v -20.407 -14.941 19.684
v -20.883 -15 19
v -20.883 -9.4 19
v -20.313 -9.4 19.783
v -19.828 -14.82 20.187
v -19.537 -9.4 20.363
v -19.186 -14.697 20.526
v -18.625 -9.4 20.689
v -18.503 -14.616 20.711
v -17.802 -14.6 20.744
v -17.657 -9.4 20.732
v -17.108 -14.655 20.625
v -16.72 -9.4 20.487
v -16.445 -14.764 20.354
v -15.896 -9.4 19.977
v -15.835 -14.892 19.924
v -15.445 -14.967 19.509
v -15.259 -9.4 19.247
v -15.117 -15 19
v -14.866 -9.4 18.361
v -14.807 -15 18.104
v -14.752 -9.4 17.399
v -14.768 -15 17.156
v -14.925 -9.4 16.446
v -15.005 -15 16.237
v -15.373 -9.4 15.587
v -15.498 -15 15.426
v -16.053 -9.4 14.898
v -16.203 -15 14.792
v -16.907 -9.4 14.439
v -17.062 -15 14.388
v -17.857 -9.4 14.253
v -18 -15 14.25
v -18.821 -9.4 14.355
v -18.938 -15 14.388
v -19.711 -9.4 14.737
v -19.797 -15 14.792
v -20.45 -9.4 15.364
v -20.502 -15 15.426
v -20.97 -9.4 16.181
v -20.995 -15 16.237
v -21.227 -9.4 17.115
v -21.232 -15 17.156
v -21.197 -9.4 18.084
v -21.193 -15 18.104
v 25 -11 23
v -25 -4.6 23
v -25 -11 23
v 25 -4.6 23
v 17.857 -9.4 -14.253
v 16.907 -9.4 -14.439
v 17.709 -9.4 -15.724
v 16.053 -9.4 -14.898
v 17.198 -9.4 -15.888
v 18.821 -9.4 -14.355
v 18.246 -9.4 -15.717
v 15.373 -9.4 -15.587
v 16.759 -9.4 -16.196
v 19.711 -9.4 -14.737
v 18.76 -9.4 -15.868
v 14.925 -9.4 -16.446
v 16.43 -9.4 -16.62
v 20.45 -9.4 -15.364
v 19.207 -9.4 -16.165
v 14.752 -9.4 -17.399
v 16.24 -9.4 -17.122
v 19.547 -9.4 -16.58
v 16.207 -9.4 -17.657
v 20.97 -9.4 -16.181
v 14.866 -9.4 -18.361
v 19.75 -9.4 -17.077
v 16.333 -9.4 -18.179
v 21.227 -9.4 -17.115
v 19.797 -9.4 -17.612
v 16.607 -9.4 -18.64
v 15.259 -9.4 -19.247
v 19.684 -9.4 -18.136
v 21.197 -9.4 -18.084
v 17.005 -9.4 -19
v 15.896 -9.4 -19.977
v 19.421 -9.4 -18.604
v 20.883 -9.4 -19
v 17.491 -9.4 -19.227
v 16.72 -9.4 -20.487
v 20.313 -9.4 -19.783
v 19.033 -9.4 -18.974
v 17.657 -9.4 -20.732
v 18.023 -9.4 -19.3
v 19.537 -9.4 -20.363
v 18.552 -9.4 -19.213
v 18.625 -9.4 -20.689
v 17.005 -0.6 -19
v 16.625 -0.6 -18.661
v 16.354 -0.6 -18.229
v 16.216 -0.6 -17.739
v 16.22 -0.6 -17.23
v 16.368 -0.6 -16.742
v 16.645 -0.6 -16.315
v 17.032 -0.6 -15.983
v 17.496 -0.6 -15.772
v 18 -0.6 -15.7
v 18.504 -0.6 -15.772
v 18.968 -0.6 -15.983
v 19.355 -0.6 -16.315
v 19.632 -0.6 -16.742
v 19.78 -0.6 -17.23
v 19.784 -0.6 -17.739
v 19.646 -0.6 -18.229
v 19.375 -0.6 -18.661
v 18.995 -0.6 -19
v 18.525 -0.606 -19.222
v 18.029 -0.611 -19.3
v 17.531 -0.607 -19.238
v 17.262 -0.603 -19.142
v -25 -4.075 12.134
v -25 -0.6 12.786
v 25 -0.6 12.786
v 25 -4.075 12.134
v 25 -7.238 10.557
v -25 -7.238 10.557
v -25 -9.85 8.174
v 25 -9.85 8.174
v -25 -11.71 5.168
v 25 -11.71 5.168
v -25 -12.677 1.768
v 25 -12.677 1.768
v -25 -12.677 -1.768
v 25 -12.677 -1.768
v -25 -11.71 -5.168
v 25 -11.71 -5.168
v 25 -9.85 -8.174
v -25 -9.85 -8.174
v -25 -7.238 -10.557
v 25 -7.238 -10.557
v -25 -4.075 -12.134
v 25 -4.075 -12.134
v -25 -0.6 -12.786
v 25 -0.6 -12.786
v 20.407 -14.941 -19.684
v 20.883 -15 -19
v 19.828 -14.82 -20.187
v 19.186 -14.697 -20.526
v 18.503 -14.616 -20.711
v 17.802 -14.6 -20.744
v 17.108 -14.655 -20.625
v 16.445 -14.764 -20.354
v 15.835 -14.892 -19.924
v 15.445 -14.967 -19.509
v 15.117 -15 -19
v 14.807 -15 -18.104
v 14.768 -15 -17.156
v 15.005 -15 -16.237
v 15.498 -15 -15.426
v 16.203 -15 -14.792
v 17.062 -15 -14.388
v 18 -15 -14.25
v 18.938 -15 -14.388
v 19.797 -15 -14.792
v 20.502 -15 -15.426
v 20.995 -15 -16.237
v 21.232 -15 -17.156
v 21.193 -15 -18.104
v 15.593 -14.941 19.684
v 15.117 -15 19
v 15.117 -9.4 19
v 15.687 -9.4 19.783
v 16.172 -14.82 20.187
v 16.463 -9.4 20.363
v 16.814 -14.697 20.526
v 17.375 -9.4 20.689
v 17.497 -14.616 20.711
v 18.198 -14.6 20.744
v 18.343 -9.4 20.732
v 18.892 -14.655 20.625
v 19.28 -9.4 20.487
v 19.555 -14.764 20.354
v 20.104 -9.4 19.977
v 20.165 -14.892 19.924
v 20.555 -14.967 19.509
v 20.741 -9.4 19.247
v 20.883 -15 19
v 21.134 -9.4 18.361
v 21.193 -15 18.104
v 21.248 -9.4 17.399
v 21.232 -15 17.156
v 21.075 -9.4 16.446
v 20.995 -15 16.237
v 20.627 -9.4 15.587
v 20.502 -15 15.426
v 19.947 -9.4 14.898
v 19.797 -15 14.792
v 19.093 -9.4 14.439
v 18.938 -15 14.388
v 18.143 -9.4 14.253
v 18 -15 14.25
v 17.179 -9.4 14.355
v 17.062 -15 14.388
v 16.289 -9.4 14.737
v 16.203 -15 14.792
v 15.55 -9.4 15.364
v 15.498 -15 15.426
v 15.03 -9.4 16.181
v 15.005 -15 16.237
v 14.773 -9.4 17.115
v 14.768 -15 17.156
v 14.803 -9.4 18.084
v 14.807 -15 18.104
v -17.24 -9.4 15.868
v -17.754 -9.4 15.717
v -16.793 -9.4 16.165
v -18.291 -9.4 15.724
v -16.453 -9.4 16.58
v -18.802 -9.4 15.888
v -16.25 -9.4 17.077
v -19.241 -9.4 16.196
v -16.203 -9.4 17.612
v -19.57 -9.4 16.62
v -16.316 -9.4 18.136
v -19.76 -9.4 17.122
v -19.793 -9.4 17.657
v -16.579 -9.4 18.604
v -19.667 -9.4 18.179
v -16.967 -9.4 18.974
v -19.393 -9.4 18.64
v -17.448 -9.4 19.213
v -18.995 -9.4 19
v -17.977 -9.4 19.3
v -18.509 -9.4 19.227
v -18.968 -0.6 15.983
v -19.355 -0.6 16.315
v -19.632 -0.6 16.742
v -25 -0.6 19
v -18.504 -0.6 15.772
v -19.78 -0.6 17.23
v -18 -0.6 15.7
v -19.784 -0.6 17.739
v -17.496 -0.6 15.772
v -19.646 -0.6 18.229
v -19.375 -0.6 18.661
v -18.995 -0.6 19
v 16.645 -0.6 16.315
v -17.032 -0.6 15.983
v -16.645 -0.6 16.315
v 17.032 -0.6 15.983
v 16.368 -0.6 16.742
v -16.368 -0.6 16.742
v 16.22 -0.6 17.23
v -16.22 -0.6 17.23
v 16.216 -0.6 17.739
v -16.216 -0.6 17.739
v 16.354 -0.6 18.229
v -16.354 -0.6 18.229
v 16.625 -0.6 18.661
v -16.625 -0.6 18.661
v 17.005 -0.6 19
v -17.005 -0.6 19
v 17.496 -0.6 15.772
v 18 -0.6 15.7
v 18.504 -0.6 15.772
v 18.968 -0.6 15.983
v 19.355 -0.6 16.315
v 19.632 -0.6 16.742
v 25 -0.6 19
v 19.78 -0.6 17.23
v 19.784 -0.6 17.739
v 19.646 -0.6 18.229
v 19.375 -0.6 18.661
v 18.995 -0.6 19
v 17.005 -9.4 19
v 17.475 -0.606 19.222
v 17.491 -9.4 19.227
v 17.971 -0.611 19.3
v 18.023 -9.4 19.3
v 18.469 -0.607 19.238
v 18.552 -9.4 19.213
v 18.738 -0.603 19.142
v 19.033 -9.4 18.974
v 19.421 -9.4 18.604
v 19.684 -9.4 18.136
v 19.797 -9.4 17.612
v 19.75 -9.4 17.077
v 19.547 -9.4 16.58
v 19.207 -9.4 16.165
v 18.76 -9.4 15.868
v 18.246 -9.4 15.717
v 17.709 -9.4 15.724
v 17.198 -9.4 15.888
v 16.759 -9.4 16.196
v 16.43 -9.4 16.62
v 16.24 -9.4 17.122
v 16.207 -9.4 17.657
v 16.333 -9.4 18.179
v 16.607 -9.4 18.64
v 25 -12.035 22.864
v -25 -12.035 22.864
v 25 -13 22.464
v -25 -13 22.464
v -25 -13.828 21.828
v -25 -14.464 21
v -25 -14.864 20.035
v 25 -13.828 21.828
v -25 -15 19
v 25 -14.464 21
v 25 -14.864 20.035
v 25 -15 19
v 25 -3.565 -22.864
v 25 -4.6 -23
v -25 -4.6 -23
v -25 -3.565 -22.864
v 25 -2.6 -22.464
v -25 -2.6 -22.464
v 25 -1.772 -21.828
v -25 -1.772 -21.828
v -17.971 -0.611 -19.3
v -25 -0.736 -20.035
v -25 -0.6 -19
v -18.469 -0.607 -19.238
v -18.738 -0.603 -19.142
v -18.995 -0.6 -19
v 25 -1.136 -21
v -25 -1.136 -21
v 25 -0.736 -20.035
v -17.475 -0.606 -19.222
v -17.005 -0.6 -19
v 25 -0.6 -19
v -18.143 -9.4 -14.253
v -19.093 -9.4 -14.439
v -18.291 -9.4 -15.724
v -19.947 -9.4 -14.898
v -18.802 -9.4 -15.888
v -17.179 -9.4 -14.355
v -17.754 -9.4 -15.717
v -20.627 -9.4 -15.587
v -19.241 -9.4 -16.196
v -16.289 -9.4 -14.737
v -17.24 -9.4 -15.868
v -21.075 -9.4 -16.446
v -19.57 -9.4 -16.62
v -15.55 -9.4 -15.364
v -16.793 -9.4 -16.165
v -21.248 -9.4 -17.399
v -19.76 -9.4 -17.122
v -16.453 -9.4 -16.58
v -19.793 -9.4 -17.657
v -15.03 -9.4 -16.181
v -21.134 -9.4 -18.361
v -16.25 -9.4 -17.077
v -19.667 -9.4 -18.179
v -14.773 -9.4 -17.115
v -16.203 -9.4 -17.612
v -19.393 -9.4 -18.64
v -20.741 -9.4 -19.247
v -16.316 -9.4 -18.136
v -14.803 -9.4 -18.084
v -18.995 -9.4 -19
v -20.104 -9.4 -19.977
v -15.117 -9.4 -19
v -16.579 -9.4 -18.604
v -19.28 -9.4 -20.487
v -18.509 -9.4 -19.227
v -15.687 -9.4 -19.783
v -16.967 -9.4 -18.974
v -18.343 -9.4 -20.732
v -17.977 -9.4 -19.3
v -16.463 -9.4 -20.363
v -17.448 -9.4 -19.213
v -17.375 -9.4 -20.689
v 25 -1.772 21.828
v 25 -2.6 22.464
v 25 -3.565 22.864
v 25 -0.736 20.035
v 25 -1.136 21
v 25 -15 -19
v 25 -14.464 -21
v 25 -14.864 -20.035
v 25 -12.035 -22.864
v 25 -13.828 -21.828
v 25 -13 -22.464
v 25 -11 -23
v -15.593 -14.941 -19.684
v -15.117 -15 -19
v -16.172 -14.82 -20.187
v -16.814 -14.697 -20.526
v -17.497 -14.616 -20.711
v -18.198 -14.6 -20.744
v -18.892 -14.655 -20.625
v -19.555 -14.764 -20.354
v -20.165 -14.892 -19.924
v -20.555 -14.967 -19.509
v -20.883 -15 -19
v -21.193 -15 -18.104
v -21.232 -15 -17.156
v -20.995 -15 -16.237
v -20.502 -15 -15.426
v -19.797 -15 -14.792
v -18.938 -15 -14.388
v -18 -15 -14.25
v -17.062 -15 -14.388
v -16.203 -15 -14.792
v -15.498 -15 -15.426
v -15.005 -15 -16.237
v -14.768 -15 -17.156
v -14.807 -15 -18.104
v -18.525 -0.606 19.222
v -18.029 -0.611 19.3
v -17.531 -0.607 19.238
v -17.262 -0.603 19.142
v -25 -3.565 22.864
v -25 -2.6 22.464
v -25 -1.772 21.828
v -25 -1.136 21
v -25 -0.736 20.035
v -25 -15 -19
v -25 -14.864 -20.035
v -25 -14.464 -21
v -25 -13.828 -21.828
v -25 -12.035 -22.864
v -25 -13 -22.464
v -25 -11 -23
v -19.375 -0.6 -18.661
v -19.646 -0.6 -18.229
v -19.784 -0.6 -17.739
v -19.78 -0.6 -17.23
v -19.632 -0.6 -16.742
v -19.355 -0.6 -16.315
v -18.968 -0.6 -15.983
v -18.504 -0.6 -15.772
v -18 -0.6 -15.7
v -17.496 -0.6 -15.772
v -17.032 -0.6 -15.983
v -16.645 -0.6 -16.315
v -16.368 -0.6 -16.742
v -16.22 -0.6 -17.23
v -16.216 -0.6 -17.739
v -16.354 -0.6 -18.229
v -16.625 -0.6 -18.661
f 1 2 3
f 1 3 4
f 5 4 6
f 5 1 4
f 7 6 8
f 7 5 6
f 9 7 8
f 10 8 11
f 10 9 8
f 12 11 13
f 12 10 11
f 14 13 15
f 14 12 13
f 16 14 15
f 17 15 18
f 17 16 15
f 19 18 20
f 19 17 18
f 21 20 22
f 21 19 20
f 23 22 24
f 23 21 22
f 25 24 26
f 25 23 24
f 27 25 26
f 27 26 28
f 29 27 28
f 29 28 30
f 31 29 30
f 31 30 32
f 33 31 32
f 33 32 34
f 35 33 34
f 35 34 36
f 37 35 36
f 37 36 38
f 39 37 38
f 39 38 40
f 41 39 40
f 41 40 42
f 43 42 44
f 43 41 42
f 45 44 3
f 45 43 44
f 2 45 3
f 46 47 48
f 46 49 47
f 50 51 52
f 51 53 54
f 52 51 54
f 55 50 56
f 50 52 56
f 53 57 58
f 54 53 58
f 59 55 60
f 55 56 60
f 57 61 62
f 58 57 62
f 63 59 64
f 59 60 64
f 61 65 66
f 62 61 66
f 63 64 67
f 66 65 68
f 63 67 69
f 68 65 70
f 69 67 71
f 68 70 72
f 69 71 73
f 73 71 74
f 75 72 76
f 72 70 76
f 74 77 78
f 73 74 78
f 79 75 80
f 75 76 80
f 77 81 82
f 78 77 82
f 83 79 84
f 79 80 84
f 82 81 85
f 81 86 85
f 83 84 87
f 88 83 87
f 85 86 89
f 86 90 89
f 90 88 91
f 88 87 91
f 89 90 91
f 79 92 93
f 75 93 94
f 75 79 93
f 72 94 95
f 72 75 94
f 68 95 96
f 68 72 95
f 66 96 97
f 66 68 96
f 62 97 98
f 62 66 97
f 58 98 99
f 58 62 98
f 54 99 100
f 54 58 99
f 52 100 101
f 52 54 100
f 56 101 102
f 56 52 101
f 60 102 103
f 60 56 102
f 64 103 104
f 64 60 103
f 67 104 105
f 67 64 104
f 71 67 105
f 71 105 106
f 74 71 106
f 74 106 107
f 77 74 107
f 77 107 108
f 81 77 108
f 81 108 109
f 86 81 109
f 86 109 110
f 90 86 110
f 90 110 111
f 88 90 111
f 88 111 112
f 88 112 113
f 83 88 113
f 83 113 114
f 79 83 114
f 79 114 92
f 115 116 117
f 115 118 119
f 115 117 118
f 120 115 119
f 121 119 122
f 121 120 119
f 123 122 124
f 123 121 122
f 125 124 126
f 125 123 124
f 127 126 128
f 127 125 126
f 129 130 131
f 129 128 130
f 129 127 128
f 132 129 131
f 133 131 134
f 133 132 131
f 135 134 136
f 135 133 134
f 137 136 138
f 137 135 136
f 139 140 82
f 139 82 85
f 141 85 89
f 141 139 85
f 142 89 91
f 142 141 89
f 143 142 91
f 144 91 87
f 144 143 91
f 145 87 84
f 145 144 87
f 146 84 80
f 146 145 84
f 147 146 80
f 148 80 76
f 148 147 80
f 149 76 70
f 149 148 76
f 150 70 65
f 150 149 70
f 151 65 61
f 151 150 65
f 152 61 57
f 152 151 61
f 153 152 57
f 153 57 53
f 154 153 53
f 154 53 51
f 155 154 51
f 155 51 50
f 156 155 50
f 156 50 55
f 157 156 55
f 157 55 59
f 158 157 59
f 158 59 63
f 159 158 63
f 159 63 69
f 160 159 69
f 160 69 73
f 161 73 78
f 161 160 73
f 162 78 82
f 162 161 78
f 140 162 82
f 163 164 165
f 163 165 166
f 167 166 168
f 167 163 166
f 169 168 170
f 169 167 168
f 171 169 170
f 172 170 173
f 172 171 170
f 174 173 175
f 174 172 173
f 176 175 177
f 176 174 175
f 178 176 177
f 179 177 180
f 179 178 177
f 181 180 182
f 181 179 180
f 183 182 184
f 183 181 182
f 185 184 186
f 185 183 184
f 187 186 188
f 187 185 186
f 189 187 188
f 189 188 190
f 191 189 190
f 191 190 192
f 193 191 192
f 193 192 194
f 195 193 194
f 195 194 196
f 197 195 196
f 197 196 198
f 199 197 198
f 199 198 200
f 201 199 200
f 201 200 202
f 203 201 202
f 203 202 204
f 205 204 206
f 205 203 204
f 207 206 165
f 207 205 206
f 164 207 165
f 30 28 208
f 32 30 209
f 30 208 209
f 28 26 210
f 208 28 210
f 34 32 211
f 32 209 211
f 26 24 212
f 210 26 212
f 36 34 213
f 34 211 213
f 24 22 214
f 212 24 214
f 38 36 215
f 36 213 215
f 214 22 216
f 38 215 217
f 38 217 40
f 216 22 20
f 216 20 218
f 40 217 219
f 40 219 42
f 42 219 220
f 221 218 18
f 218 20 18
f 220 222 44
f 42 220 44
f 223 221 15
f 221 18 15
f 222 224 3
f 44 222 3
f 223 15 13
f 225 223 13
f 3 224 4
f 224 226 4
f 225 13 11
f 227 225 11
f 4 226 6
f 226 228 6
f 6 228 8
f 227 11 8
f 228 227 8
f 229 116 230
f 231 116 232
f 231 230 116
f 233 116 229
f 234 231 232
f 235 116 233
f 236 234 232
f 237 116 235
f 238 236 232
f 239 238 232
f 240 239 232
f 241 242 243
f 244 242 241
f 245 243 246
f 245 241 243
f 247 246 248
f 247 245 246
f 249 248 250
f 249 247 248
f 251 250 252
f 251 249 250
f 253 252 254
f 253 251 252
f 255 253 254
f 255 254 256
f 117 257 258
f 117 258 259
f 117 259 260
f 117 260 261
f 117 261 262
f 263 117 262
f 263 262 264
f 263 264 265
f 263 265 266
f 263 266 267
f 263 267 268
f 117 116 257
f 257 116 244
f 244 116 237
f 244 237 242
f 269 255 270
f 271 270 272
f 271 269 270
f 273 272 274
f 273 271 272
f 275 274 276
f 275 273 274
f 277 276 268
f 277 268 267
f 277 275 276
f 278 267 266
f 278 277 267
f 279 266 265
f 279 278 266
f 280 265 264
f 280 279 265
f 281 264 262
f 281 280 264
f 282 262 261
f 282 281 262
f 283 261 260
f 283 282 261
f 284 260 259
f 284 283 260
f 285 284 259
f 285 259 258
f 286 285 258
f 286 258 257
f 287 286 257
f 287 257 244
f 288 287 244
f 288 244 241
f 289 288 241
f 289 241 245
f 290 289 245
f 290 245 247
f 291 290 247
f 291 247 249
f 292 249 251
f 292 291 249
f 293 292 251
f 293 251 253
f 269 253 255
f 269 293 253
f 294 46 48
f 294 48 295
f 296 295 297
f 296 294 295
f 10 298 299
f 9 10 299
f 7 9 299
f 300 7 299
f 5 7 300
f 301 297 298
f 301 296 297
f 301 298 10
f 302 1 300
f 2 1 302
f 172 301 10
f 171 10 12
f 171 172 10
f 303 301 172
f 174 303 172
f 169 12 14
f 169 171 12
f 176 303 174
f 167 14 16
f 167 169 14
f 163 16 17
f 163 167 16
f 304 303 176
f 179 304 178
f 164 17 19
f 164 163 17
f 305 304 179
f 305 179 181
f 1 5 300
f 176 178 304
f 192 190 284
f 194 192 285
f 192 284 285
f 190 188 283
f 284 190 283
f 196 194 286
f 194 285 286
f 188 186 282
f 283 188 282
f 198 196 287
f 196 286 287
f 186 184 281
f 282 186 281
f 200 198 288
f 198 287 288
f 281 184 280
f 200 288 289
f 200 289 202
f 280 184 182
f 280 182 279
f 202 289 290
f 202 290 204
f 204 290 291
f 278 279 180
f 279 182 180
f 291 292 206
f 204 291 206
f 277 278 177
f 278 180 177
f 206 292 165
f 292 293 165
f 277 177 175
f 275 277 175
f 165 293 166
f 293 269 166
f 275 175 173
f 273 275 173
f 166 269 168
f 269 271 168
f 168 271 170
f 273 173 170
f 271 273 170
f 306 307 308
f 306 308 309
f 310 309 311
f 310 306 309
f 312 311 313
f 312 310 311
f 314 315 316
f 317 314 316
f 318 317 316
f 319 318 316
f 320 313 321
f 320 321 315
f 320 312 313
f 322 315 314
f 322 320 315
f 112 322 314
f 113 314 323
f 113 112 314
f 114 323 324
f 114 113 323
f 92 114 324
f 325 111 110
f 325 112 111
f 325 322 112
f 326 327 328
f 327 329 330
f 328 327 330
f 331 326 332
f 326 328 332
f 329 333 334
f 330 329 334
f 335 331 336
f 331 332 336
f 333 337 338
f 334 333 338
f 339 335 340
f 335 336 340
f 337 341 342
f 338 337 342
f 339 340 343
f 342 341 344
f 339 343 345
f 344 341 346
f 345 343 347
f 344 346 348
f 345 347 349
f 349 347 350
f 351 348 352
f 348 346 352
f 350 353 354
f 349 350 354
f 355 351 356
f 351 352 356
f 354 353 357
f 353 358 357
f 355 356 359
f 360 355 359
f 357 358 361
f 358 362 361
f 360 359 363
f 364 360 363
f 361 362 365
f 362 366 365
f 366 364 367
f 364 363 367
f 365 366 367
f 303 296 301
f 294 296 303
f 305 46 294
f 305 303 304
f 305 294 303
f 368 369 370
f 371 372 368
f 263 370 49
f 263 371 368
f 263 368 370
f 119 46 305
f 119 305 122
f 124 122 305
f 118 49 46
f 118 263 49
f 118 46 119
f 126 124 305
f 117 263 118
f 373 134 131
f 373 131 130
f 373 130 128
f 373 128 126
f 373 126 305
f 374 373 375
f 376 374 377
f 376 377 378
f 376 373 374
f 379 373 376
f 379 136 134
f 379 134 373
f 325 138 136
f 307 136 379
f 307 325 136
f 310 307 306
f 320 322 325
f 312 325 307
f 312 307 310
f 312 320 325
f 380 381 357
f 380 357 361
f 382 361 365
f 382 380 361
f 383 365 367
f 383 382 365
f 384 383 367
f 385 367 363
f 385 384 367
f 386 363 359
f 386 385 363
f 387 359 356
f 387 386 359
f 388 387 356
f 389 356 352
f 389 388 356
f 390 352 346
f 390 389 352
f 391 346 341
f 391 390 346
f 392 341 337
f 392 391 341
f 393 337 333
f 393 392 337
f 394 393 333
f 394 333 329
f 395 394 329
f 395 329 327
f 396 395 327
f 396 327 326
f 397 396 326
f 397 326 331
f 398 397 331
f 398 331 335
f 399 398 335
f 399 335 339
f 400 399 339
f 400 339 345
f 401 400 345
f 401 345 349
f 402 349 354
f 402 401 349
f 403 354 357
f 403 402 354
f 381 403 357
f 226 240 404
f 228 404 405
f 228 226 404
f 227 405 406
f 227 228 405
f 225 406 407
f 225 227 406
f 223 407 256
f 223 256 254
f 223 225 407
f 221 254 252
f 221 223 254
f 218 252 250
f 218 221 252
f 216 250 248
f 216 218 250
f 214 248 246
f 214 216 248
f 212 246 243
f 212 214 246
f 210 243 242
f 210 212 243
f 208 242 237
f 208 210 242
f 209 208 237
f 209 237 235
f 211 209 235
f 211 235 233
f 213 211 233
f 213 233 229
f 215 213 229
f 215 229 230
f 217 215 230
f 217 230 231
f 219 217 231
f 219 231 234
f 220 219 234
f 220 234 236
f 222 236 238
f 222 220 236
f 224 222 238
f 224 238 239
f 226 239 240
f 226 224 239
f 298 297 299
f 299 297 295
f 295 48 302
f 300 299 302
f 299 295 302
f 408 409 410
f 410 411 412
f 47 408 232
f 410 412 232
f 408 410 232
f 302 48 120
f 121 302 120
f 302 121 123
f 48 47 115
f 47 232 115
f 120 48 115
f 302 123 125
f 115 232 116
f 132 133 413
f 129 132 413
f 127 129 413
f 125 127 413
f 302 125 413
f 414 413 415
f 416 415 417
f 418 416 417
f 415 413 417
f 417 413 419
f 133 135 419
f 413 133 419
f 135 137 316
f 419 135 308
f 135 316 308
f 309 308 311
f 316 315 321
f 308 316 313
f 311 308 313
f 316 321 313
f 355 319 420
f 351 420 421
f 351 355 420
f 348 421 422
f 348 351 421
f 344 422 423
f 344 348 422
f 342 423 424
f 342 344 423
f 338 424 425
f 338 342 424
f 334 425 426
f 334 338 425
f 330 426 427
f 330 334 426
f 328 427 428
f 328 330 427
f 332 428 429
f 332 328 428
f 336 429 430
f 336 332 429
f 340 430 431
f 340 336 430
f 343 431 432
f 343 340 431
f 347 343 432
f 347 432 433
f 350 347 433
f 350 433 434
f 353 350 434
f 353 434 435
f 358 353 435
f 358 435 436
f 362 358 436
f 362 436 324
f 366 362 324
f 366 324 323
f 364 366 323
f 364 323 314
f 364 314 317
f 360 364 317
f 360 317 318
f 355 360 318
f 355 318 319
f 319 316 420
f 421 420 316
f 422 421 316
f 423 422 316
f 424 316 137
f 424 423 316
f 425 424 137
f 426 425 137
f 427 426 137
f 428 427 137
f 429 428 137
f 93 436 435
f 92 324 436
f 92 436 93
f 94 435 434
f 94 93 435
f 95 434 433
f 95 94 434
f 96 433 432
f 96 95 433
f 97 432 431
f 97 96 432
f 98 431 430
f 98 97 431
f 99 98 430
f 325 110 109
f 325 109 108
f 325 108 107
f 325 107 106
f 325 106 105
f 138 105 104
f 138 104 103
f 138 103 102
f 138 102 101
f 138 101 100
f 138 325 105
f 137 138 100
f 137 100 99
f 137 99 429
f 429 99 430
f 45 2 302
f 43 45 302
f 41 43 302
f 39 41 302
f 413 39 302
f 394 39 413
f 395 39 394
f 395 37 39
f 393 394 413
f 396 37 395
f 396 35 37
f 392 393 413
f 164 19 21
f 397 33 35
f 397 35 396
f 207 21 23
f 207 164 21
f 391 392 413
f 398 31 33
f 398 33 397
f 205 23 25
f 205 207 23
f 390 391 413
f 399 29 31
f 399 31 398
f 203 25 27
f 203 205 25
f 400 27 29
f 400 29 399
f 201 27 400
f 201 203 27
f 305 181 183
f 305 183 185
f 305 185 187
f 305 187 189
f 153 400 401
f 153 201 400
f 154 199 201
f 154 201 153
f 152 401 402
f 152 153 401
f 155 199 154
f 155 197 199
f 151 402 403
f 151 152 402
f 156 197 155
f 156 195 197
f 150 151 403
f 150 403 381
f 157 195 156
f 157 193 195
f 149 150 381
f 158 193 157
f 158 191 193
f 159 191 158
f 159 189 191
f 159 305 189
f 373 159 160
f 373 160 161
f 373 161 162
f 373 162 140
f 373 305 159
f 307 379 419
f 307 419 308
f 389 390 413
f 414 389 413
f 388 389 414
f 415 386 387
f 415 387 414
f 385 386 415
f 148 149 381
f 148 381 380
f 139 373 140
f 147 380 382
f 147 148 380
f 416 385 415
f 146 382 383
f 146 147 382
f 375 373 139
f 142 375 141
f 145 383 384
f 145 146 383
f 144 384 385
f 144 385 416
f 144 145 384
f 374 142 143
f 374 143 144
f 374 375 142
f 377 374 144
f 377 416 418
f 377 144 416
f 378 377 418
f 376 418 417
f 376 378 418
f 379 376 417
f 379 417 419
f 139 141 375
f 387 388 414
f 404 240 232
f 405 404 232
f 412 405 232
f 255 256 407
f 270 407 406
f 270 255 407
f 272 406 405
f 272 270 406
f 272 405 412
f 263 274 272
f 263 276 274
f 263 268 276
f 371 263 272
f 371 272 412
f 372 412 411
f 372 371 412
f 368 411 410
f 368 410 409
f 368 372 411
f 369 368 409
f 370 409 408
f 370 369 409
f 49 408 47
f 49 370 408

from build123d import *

# Parameters (mm, degrees)
BOSS_EXTRUDE1_DEPTH     = 25
CUT_EXTRUDE1_DEPTH      = 38.134889255
CUT_EXTRUDE1_DEPTH_BACK = 38.134889255
SKETCH2_R               = 12.8
SKETCH3_R               = 1.8
CUT_EXTRUDE2_DEPTH      = 16
SKETCH4_R               = 3.25
CUT_EXTRUDE3_DEPTH      = 5.6


with BuildPart() as part:
    # Sketch1 → Boss-Extrude1 (new, symmetric)
    with BuildSketch(Plane(origin=(0, 0, 0), x_dir=(0, 0, -1), z_dir=(1, 0, 0))):
        with BuildLine():
            Line((-19, -15), (19, -15))
            ThreePointArc((19, -15), (21.828427125, -13.828427125), (23, -11))
            Line((23, -11), (23, -4.6))
            ThreePointArc((23, -4.6), (21.828427125, -1.771572875), (19, -0.6))
            Line((19, -0.6), (-19, -0.6))
            ThreePointArc((-19, -0.6), (-21.828427125, -1.771572875), (-23, -4.6))
            Line((-23, -4.6), (-23, -11))
            ThreePointArc((-23, -11), (-21.828427125, -13.828427125), (-19, -15))
        make_face()
    extrude(amount=BOSS_EXTRUDE1_DEPTH, both=True)

    # Sketch2 → Cut-Extrude1 (cut, two sides: drawn at the far end of the back side and taken through both)
    with BuildSketch(Plane(origin=(0, 0, 0), x_dir=(0, 0, -1), z_dir=(1, 0, 0)).offset(-CUT_EXTRUDE1_DEPTH_BACK)):
        Circle(SKETCH2_R)
    extrude(amount=CUT_EXTRUDE1_DEPTH + CUT_EXTRUDE1_DEPTH_BACK, mode=Mode.SUBTRACT)

    # Sketch3 → Cut-Extrude2 (cut)
    with BuildSketch(Plane(origin=(0, -15, 0), x_dir=(1, 0, 0), z_dir=(0, 1, 0))):
        with Locations(Location((18, -17.5, 0), (0, 0, 236.442690238))):
            Circle(SKETCH3_R)
        with Locations(Location((18, 17.5, 0), (0, 0, 123.557309762))):
            Circle(SKETCH3_R)
        with Locations(Location((-18, -17.5, 0), (0, 0, 236.442690238))):
            Circle(SKETCH3_R)
        with Locations(Location((-18, 17.5, 0), (0, 0, 123.557309762))):
            Circle(SKETCH3_R)
    extrude(amount=CUT_EXTRUDE2_DEPTH, mode=Mode.SUBTRACT)

    # Sketch4 → Cut-Extrude3 (cut)
    with BuildSketch(Plane(origin=(0, -15, 0), x_dir=(1, 0, 0), z_dir=(0, 1, 0))):
        with Locations(Location((18, -17.5, 0), (0, 0, 207.48642625))):
            Circle(SKETCH4_R)
        with Locations(Location((18, 17.5, 0), (0, 0, 27.48642625))):
            Circle(SKETCH4_R)
        with Locations(Location((-18, -17.5, 0), (0, 0, 207.48642625))):
            Circle(SKETCH4_R)
        with Locations(Location((-18, 17.5, 0), (0, 0, 27.48642625))):
            Circle(SKETCH4_R)
    extrude(amount=CUT_EXTRUDE3_DEPTH, mode=Mode.SUBTRACT)


solid = part.part
